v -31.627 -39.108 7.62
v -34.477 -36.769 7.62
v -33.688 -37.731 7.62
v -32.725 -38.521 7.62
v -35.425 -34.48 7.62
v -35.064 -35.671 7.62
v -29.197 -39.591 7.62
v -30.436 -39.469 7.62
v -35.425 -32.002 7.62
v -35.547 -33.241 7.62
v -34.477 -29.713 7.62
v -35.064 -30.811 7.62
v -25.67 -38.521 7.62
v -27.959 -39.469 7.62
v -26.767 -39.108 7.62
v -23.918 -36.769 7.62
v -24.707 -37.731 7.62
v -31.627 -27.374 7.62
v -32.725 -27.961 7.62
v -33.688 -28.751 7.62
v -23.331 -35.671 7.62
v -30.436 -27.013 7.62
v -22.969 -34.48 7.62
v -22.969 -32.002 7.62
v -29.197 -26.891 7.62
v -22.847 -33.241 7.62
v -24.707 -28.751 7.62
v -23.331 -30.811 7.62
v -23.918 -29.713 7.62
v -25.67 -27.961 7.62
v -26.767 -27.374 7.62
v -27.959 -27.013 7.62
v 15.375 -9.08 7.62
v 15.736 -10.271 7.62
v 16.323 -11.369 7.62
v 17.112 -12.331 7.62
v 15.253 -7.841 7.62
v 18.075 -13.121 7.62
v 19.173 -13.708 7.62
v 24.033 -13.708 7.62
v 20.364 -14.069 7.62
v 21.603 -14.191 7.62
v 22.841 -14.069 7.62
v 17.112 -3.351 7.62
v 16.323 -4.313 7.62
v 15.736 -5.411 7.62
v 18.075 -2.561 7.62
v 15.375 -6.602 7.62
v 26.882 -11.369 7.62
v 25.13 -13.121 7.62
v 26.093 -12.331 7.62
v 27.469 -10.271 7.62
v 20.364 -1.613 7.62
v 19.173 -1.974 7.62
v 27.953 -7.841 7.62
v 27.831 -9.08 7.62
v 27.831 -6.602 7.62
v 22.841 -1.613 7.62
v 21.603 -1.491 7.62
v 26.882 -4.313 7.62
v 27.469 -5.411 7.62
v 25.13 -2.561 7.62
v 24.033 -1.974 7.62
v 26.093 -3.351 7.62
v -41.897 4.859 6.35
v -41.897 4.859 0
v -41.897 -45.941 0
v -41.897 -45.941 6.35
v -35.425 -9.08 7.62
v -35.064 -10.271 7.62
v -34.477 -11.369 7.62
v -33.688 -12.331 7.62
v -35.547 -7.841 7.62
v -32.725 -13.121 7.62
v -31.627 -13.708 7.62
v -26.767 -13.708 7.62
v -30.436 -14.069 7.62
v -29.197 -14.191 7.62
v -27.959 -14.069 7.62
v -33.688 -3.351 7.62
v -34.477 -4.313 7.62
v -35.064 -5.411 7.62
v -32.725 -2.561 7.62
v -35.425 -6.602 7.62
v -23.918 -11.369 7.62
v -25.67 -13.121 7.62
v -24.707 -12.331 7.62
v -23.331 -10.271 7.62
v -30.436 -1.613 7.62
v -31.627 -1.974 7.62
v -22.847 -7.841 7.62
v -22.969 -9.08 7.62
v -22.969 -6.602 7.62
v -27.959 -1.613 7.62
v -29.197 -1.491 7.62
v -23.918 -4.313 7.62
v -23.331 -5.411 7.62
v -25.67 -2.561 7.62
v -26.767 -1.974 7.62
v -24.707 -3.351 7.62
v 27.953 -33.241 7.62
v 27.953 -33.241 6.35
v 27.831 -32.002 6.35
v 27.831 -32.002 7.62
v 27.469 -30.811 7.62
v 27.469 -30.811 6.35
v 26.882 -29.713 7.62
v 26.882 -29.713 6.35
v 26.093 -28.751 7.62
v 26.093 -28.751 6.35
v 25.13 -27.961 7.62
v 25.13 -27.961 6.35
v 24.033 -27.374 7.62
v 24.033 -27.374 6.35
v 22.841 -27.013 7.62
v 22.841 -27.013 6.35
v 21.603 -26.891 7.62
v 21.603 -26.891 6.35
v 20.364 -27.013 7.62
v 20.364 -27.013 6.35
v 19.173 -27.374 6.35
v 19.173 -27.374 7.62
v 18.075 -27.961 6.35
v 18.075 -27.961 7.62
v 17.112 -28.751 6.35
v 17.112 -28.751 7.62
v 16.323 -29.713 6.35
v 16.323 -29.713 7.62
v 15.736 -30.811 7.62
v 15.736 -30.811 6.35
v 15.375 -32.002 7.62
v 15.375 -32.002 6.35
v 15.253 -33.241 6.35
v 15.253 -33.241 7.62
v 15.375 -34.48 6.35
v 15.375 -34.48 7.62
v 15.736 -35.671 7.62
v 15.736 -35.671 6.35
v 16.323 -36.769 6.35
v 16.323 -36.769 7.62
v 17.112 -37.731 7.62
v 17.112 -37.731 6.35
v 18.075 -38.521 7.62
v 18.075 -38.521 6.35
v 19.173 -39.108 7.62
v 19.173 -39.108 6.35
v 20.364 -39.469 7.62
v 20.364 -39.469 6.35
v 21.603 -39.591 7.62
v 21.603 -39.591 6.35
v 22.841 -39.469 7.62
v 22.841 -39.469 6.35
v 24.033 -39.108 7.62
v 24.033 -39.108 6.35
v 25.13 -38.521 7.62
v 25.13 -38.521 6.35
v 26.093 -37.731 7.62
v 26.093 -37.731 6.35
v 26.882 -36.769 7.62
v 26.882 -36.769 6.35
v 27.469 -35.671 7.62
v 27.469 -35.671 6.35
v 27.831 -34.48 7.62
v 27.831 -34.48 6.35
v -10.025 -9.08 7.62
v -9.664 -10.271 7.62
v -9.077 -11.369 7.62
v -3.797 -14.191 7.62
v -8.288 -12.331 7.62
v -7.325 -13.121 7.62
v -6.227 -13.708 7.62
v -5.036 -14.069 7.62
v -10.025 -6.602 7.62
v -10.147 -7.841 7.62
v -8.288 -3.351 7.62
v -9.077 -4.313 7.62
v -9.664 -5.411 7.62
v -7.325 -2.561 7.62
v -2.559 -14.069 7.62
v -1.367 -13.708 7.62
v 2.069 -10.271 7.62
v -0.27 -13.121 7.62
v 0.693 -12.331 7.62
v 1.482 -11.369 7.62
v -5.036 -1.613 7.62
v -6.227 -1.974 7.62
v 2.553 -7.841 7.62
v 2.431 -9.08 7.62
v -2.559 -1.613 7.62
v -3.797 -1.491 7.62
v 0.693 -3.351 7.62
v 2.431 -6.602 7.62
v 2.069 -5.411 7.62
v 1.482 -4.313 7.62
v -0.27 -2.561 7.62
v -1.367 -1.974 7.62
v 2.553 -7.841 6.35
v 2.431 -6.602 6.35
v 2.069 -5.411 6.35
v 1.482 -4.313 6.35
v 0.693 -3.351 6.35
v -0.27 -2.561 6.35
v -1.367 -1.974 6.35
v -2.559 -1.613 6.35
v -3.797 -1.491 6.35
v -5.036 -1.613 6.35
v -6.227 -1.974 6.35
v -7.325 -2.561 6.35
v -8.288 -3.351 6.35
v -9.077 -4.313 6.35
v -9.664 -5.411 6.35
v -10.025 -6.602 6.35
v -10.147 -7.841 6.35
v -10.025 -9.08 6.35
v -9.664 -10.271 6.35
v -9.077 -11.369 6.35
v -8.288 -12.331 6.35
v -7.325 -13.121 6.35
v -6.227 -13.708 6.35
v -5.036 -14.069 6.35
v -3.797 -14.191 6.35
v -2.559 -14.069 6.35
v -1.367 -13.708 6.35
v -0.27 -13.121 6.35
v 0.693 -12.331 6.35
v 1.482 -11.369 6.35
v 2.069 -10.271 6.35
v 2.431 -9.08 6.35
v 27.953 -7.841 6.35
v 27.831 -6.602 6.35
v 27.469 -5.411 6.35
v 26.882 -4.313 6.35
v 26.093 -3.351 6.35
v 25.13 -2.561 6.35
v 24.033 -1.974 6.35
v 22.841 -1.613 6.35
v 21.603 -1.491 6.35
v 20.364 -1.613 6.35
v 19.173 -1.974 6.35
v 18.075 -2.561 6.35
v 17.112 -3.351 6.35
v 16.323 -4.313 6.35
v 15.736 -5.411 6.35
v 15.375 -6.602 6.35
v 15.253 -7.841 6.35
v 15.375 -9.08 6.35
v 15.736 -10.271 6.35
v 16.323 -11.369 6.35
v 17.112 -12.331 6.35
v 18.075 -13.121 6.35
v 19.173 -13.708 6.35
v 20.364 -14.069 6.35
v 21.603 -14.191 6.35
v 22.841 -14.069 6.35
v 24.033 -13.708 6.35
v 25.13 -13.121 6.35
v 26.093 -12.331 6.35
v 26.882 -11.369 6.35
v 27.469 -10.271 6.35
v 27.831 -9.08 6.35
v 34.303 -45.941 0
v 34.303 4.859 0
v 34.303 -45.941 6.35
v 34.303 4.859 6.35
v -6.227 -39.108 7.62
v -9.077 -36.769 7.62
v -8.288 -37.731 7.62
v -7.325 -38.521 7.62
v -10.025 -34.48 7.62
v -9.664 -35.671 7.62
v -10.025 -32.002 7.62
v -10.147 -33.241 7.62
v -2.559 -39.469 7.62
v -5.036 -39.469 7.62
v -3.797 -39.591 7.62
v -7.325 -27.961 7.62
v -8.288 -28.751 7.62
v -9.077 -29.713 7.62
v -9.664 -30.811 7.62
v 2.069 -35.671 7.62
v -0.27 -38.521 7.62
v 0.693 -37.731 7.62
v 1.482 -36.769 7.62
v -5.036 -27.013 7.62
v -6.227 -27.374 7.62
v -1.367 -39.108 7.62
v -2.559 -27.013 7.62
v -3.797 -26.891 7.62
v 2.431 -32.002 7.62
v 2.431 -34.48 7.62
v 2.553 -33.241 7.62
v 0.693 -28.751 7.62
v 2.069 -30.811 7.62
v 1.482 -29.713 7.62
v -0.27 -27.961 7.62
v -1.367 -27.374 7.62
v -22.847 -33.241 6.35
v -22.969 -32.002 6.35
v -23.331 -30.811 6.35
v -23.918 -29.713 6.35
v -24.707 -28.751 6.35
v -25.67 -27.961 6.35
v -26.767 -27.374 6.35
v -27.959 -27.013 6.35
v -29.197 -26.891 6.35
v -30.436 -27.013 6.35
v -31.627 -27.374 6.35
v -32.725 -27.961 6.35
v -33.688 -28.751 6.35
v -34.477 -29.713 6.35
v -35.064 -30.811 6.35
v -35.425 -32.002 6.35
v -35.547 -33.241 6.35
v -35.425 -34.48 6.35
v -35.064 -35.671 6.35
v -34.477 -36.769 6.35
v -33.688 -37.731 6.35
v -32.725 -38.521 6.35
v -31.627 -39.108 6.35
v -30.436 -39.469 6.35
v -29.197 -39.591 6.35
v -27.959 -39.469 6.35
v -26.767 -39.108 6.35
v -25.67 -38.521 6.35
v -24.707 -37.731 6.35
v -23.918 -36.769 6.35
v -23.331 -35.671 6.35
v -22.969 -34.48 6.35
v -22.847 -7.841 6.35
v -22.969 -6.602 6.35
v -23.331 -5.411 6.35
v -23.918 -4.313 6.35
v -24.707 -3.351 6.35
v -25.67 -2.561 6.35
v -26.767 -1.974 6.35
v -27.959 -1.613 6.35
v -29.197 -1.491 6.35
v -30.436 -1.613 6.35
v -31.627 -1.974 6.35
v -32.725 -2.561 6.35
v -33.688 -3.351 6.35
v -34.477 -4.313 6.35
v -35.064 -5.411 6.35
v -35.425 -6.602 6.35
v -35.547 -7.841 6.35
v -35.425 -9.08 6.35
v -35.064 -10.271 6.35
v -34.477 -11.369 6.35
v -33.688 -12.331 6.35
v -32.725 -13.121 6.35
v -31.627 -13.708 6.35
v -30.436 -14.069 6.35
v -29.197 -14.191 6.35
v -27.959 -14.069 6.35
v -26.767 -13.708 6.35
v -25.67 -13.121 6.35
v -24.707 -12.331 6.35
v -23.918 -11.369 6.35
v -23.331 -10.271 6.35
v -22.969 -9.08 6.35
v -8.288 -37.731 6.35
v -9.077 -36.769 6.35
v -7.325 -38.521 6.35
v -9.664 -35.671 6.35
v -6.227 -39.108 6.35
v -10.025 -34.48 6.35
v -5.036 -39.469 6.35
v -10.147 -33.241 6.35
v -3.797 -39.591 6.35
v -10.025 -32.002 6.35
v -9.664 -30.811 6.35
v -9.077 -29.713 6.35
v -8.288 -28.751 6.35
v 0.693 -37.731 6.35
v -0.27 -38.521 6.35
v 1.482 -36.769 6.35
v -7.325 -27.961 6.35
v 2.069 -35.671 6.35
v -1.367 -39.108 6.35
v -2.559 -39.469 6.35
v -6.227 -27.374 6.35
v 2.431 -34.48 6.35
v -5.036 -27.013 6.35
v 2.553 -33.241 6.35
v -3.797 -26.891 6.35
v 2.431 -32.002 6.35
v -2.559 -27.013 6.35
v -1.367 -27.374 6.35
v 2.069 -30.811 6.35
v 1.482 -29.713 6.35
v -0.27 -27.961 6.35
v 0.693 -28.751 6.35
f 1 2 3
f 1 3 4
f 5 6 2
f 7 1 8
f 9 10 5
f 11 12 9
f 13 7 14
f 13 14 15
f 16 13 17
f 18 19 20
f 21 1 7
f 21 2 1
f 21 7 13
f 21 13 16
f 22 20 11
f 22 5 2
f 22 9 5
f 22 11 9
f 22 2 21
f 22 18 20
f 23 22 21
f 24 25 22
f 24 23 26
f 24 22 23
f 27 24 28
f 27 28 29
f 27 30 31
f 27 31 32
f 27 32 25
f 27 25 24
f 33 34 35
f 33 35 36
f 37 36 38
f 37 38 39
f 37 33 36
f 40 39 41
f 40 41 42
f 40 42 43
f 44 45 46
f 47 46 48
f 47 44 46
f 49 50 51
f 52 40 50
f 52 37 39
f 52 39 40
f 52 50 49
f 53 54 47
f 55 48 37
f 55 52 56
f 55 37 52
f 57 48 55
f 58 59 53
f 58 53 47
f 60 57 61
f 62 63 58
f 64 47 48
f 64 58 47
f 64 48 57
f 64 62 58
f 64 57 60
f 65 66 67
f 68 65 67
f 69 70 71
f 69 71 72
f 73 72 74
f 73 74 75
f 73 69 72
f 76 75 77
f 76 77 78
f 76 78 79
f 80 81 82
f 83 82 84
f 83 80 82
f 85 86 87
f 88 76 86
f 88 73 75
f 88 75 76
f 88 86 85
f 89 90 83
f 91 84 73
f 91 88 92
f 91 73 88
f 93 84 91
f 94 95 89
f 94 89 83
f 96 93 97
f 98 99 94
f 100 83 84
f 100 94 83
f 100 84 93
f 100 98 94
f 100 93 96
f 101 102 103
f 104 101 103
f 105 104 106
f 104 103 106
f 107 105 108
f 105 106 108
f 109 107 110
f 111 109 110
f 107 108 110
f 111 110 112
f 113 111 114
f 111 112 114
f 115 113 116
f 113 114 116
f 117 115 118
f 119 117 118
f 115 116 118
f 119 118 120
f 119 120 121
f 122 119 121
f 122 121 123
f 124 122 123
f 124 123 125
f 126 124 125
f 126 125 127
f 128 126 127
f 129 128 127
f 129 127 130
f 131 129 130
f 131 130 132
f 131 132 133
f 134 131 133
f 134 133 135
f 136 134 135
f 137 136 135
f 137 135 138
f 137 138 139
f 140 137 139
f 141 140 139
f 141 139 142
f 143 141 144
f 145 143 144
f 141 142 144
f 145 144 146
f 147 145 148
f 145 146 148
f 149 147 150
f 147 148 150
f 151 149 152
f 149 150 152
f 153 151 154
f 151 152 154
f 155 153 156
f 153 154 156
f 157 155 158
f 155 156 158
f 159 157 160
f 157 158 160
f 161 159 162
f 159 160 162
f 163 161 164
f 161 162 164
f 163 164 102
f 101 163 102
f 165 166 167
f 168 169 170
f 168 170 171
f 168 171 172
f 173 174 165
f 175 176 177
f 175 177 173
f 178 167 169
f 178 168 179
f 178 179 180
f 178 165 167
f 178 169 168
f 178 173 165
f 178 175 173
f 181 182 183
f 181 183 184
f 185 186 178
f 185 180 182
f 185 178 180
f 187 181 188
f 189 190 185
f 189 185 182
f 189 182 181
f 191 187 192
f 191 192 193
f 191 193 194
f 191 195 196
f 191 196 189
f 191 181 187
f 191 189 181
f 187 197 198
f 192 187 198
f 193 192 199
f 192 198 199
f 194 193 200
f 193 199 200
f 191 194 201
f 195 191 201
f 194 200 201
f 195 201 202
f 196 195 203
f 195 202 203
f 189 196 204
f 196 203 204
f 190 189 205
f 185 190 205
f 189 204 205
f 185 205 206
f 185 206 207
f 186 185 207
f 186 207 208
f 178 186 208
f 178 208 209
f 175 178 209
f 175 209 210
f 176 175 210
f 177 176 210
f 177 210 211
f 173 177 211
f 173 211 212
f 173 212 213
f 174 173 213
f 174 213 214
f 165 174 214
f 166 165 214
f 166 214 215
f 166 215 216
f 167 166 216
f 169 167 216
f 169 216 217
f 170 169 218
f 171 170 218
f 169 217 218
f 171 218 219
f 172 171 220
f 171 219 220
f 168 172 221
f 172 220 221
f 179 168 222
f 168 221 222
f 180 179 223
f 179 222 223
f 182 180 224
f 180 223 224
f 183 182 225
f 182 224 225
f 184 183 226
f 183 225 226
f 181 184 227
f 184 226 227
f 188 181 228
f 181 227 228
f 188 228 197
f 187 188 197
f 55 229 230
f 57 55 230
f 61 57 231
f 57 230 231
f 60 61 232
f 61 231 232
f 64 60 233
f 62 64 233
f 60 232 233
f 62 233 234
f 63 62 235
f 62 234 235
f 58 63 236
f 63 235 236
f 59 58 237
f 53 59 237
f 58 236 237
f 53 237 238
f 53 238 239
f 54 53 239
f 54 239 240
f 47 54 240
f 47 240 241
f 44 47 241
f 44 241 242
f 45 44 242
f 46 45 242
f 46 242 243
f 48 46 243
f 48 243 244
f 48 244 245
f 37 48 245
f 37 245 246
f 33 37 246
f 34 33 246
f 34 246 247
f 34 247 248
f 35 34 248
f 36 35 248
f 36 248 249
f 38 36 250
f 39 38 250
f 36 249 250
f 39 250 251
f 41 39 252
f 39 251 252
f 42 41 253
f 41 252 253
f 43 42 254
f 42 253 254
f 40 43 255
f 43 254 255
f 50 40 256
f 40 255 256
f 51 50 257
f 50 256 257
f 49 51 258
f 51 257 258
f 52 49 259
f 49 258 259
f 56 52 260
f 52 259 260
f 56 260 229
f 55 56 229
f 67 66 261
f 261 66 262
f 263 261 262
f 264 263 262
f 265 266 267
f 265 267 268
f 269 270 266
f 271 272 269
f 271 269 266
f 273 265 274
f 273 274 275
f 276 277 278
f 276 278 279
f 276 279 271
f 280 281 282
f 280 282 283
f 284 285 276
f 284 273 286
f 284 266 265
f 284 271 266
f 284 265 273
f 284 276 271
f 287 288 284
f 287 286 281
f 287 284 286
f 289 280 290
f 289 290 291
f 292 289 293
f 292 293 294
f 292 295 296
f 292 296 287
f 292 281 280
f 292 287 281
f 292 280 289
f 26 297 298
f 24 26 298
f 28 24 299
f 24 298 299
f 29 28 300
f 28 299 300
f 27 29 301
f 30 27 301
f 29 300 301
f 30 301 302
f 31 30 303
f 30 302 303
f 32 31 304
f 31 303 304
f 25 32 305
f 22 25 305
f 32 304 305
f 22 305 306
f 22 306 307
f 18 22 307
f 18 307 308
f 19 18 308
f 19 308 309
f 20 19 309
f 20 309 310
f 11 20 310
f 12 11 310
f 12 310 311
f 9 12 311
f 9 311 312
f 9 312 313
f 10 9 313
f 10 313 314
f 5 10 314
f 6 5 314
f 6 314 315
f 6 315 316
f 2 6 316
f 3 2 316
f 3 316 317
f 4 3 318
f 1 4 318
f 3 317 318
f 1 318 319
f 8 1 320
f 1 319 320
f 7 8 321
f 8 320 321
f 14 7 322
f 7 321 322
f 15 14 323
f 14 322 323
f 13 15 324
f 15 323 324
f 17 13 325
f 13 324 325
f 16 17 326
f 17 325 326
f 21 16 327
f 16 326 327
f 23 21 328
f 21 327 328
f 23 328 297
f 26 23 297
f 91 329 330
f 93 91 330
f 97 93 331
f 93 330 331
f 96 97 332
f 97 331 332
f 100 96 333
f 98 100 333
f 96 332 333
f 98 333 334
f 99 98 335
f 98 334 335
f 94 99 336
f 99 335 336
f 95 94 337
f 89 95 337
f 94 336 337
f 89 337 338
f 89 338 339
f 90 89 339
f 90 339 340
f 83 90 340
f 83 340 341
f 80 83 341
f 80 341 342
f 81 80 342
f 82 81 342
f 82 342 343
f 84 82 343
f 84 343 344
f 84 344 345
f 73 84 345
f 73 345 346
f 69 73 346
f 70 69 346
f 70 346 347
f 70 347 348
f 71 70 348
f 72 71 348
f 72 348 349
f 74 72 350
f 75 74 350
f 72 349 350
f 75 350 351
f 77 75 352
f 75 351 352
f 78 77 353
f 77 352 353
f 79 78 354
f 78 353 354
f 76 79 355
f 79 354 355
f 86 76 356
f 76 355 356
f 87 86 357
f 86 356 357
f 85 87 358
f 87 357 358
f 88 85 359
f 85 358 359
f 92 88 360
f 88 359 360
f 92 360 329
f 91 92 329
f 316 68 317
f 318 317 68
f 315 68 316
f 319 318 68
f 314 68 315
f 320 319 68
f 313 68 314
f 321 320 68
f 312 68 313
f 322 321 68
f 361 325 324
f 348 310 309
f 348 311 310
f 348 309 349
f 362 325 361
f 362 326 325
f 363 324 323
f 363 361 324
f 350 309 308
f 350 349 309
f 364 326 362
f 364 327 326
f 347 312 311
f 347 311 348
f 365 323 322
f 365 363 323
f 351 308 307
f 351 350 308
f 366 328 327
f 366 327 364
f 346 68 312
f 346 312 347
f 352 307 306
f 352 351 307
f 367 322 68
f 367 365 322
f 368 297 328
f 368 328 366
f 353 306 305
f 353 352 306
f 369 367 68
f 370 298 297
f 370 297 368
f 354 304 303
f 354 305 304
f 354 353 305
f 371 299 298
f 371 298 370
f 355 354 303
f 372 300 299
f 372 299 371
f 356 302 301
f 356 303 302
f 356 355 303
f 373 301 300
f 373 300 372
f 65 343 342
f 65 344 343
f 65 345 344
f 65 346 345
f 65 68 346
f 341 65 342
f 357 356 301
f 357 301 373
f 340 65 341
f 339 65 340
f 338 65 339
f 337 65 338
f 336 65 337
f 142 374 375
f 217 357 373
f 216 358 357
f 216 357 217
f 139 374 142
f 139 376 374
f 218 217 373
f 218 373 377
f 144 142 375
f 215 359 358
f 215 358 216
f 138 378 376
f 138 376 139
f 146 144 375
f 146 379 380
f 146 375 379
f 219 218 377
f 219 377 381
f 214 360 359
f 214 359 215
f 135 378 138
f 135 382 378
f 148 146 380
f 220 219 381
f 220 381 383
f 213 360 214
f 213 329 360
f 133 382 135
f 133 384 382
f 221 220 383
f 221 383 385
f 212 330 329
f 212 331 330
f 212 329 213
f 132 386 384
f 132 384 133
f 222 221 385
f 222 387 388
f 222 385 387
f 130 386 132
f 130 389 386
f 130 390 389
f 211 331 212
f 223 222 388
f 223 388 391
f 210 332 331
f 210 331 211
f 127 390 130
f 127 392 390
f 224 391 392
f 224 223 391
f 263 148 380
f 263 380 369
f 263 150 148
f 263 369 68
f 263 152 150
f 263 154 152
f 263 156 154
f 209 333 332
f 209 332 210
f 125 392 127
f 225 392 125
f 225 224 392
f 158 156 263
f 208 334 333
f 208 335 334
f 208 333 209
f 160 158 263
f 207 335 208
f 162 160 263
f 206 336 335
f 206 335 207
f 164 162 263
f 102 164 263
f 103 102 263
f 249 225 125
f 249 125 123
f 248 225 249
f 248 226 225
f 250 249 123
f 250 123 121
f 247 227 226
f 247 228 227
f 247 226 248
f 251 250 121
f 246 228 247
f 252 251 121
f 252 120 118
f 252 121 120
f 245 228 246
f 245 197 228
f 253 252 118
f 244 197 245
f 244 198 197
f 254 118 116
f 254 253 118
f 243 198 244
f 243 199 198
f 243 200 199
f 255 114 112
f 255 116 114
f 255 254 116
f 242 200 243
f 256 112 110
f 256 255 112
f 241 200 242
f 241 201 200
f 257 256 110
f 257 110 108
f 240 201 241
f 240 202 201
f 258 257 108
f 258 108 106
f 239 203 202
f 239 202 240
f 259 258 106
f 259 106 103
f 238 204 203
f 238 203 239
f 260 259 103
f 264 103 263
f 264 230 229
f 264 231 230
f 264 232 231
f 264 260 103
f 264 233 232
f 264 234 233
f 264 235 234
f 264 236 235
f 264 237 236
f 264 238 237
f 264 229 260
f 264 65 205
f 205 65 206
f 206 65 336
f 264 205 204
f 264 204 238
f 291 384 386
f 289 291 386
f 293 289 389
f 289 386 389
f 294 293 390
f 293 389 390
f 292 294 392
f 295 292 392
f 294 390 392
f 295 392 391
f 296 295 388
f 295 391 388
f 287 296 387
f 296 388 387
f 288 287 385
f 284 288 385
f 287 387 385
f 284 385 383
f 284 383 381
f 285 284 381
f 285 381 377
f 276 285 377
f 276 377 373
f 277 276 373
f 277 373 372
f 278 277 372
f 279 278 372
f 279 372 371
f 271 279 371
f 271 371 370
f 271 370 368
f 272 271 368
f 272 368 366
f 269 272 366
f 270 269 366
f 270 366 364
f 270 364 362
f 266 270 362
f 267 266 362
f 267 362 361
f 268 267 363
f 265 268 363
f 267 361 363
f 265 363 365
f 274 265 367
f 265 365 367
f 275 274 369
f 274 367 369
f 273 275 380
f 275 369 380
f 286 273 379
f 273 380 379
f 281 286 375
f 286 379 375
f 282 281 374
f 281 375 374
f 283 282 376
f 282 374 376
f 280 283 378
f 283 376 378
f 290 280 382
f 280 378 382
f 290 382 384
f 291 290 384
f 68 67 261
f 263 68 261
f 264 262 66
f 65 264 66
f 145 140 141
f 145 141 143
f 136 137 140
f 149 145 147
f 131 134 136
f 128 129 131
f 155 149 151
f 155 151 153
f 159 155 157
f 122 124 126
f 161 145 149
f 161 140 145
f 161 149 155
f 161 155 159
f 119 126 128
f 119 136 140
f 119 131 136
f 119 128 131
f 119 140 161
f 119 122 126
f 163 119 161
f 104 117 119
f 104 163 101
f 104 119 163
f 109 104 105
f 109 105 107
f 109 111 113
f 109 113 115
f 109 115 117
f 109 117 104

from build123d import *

# Parameters (mm, degrees)
F0_R     = 6.35
F1_DEPTH = 6.35
F2_DEPTH = 7.62


with BuildPart() as f1:
    # F0 (on Top) → F1 (new body)
    with BuildSketch(Plane.XY):
        Polygon((-29.197408, 4.85902), (-41.897408, 4.85902), (-41.897408, -7.84098), (-41.897408, -33.24098), (-41.897408, -45.94098), (34.302592, -45.94098), (34.302592, 4.85902), (21.602592, 4.85902), (-3.797408, 4.85902), align=None)
        with Locations((-29.197408, -33.24098)):
            Circle(F0_R, mode=Mode.SUBTRACT)
        with Locations((-3.797408, -33.24098)):
            Circle(F0_R, mode=Mode.SUBTRACT)
        with Locations((21.602592, -33.24098)):
            Circle(F0_R, mode=Mode.SUBTRACT)
        with Locations((-29.197408, -7.84098)):
            Circle(F0_R, mode=Mode.SUBTRACT)
        with Locations((-3.797408, -7.84098)):
            Circle(F0_R, mode=Mode.SUBTRACT)
        with Locations((21.602592, -7.84098)):
            Circle(F0_R, mode=Mode.SUBTRACT)
    extrude(amount=F1_DEPTH)

    # F0 (on Top) → F2 (join)
    with BuildSketch(Plane.XY):
        with Locations((21.602592, -7.84098)):
            Circle(F0_R)
        with Locations((-3.797408, -7.84098)):
            Circle(F0_R)
        with Locations((-29.197408, -7.84098)):
            Circle(F0_R)
        with Locations((-29.197408, -33.24098)):
            Circle(F0_R)
        with Locations((-3.797408, -33.24098)):
            Circle(F0_R)
        with Locations((21.602592, -33.24098)):
            Circle(F0_R)
    extrude(amount=F2_DEPTH)


solid = f1.part
